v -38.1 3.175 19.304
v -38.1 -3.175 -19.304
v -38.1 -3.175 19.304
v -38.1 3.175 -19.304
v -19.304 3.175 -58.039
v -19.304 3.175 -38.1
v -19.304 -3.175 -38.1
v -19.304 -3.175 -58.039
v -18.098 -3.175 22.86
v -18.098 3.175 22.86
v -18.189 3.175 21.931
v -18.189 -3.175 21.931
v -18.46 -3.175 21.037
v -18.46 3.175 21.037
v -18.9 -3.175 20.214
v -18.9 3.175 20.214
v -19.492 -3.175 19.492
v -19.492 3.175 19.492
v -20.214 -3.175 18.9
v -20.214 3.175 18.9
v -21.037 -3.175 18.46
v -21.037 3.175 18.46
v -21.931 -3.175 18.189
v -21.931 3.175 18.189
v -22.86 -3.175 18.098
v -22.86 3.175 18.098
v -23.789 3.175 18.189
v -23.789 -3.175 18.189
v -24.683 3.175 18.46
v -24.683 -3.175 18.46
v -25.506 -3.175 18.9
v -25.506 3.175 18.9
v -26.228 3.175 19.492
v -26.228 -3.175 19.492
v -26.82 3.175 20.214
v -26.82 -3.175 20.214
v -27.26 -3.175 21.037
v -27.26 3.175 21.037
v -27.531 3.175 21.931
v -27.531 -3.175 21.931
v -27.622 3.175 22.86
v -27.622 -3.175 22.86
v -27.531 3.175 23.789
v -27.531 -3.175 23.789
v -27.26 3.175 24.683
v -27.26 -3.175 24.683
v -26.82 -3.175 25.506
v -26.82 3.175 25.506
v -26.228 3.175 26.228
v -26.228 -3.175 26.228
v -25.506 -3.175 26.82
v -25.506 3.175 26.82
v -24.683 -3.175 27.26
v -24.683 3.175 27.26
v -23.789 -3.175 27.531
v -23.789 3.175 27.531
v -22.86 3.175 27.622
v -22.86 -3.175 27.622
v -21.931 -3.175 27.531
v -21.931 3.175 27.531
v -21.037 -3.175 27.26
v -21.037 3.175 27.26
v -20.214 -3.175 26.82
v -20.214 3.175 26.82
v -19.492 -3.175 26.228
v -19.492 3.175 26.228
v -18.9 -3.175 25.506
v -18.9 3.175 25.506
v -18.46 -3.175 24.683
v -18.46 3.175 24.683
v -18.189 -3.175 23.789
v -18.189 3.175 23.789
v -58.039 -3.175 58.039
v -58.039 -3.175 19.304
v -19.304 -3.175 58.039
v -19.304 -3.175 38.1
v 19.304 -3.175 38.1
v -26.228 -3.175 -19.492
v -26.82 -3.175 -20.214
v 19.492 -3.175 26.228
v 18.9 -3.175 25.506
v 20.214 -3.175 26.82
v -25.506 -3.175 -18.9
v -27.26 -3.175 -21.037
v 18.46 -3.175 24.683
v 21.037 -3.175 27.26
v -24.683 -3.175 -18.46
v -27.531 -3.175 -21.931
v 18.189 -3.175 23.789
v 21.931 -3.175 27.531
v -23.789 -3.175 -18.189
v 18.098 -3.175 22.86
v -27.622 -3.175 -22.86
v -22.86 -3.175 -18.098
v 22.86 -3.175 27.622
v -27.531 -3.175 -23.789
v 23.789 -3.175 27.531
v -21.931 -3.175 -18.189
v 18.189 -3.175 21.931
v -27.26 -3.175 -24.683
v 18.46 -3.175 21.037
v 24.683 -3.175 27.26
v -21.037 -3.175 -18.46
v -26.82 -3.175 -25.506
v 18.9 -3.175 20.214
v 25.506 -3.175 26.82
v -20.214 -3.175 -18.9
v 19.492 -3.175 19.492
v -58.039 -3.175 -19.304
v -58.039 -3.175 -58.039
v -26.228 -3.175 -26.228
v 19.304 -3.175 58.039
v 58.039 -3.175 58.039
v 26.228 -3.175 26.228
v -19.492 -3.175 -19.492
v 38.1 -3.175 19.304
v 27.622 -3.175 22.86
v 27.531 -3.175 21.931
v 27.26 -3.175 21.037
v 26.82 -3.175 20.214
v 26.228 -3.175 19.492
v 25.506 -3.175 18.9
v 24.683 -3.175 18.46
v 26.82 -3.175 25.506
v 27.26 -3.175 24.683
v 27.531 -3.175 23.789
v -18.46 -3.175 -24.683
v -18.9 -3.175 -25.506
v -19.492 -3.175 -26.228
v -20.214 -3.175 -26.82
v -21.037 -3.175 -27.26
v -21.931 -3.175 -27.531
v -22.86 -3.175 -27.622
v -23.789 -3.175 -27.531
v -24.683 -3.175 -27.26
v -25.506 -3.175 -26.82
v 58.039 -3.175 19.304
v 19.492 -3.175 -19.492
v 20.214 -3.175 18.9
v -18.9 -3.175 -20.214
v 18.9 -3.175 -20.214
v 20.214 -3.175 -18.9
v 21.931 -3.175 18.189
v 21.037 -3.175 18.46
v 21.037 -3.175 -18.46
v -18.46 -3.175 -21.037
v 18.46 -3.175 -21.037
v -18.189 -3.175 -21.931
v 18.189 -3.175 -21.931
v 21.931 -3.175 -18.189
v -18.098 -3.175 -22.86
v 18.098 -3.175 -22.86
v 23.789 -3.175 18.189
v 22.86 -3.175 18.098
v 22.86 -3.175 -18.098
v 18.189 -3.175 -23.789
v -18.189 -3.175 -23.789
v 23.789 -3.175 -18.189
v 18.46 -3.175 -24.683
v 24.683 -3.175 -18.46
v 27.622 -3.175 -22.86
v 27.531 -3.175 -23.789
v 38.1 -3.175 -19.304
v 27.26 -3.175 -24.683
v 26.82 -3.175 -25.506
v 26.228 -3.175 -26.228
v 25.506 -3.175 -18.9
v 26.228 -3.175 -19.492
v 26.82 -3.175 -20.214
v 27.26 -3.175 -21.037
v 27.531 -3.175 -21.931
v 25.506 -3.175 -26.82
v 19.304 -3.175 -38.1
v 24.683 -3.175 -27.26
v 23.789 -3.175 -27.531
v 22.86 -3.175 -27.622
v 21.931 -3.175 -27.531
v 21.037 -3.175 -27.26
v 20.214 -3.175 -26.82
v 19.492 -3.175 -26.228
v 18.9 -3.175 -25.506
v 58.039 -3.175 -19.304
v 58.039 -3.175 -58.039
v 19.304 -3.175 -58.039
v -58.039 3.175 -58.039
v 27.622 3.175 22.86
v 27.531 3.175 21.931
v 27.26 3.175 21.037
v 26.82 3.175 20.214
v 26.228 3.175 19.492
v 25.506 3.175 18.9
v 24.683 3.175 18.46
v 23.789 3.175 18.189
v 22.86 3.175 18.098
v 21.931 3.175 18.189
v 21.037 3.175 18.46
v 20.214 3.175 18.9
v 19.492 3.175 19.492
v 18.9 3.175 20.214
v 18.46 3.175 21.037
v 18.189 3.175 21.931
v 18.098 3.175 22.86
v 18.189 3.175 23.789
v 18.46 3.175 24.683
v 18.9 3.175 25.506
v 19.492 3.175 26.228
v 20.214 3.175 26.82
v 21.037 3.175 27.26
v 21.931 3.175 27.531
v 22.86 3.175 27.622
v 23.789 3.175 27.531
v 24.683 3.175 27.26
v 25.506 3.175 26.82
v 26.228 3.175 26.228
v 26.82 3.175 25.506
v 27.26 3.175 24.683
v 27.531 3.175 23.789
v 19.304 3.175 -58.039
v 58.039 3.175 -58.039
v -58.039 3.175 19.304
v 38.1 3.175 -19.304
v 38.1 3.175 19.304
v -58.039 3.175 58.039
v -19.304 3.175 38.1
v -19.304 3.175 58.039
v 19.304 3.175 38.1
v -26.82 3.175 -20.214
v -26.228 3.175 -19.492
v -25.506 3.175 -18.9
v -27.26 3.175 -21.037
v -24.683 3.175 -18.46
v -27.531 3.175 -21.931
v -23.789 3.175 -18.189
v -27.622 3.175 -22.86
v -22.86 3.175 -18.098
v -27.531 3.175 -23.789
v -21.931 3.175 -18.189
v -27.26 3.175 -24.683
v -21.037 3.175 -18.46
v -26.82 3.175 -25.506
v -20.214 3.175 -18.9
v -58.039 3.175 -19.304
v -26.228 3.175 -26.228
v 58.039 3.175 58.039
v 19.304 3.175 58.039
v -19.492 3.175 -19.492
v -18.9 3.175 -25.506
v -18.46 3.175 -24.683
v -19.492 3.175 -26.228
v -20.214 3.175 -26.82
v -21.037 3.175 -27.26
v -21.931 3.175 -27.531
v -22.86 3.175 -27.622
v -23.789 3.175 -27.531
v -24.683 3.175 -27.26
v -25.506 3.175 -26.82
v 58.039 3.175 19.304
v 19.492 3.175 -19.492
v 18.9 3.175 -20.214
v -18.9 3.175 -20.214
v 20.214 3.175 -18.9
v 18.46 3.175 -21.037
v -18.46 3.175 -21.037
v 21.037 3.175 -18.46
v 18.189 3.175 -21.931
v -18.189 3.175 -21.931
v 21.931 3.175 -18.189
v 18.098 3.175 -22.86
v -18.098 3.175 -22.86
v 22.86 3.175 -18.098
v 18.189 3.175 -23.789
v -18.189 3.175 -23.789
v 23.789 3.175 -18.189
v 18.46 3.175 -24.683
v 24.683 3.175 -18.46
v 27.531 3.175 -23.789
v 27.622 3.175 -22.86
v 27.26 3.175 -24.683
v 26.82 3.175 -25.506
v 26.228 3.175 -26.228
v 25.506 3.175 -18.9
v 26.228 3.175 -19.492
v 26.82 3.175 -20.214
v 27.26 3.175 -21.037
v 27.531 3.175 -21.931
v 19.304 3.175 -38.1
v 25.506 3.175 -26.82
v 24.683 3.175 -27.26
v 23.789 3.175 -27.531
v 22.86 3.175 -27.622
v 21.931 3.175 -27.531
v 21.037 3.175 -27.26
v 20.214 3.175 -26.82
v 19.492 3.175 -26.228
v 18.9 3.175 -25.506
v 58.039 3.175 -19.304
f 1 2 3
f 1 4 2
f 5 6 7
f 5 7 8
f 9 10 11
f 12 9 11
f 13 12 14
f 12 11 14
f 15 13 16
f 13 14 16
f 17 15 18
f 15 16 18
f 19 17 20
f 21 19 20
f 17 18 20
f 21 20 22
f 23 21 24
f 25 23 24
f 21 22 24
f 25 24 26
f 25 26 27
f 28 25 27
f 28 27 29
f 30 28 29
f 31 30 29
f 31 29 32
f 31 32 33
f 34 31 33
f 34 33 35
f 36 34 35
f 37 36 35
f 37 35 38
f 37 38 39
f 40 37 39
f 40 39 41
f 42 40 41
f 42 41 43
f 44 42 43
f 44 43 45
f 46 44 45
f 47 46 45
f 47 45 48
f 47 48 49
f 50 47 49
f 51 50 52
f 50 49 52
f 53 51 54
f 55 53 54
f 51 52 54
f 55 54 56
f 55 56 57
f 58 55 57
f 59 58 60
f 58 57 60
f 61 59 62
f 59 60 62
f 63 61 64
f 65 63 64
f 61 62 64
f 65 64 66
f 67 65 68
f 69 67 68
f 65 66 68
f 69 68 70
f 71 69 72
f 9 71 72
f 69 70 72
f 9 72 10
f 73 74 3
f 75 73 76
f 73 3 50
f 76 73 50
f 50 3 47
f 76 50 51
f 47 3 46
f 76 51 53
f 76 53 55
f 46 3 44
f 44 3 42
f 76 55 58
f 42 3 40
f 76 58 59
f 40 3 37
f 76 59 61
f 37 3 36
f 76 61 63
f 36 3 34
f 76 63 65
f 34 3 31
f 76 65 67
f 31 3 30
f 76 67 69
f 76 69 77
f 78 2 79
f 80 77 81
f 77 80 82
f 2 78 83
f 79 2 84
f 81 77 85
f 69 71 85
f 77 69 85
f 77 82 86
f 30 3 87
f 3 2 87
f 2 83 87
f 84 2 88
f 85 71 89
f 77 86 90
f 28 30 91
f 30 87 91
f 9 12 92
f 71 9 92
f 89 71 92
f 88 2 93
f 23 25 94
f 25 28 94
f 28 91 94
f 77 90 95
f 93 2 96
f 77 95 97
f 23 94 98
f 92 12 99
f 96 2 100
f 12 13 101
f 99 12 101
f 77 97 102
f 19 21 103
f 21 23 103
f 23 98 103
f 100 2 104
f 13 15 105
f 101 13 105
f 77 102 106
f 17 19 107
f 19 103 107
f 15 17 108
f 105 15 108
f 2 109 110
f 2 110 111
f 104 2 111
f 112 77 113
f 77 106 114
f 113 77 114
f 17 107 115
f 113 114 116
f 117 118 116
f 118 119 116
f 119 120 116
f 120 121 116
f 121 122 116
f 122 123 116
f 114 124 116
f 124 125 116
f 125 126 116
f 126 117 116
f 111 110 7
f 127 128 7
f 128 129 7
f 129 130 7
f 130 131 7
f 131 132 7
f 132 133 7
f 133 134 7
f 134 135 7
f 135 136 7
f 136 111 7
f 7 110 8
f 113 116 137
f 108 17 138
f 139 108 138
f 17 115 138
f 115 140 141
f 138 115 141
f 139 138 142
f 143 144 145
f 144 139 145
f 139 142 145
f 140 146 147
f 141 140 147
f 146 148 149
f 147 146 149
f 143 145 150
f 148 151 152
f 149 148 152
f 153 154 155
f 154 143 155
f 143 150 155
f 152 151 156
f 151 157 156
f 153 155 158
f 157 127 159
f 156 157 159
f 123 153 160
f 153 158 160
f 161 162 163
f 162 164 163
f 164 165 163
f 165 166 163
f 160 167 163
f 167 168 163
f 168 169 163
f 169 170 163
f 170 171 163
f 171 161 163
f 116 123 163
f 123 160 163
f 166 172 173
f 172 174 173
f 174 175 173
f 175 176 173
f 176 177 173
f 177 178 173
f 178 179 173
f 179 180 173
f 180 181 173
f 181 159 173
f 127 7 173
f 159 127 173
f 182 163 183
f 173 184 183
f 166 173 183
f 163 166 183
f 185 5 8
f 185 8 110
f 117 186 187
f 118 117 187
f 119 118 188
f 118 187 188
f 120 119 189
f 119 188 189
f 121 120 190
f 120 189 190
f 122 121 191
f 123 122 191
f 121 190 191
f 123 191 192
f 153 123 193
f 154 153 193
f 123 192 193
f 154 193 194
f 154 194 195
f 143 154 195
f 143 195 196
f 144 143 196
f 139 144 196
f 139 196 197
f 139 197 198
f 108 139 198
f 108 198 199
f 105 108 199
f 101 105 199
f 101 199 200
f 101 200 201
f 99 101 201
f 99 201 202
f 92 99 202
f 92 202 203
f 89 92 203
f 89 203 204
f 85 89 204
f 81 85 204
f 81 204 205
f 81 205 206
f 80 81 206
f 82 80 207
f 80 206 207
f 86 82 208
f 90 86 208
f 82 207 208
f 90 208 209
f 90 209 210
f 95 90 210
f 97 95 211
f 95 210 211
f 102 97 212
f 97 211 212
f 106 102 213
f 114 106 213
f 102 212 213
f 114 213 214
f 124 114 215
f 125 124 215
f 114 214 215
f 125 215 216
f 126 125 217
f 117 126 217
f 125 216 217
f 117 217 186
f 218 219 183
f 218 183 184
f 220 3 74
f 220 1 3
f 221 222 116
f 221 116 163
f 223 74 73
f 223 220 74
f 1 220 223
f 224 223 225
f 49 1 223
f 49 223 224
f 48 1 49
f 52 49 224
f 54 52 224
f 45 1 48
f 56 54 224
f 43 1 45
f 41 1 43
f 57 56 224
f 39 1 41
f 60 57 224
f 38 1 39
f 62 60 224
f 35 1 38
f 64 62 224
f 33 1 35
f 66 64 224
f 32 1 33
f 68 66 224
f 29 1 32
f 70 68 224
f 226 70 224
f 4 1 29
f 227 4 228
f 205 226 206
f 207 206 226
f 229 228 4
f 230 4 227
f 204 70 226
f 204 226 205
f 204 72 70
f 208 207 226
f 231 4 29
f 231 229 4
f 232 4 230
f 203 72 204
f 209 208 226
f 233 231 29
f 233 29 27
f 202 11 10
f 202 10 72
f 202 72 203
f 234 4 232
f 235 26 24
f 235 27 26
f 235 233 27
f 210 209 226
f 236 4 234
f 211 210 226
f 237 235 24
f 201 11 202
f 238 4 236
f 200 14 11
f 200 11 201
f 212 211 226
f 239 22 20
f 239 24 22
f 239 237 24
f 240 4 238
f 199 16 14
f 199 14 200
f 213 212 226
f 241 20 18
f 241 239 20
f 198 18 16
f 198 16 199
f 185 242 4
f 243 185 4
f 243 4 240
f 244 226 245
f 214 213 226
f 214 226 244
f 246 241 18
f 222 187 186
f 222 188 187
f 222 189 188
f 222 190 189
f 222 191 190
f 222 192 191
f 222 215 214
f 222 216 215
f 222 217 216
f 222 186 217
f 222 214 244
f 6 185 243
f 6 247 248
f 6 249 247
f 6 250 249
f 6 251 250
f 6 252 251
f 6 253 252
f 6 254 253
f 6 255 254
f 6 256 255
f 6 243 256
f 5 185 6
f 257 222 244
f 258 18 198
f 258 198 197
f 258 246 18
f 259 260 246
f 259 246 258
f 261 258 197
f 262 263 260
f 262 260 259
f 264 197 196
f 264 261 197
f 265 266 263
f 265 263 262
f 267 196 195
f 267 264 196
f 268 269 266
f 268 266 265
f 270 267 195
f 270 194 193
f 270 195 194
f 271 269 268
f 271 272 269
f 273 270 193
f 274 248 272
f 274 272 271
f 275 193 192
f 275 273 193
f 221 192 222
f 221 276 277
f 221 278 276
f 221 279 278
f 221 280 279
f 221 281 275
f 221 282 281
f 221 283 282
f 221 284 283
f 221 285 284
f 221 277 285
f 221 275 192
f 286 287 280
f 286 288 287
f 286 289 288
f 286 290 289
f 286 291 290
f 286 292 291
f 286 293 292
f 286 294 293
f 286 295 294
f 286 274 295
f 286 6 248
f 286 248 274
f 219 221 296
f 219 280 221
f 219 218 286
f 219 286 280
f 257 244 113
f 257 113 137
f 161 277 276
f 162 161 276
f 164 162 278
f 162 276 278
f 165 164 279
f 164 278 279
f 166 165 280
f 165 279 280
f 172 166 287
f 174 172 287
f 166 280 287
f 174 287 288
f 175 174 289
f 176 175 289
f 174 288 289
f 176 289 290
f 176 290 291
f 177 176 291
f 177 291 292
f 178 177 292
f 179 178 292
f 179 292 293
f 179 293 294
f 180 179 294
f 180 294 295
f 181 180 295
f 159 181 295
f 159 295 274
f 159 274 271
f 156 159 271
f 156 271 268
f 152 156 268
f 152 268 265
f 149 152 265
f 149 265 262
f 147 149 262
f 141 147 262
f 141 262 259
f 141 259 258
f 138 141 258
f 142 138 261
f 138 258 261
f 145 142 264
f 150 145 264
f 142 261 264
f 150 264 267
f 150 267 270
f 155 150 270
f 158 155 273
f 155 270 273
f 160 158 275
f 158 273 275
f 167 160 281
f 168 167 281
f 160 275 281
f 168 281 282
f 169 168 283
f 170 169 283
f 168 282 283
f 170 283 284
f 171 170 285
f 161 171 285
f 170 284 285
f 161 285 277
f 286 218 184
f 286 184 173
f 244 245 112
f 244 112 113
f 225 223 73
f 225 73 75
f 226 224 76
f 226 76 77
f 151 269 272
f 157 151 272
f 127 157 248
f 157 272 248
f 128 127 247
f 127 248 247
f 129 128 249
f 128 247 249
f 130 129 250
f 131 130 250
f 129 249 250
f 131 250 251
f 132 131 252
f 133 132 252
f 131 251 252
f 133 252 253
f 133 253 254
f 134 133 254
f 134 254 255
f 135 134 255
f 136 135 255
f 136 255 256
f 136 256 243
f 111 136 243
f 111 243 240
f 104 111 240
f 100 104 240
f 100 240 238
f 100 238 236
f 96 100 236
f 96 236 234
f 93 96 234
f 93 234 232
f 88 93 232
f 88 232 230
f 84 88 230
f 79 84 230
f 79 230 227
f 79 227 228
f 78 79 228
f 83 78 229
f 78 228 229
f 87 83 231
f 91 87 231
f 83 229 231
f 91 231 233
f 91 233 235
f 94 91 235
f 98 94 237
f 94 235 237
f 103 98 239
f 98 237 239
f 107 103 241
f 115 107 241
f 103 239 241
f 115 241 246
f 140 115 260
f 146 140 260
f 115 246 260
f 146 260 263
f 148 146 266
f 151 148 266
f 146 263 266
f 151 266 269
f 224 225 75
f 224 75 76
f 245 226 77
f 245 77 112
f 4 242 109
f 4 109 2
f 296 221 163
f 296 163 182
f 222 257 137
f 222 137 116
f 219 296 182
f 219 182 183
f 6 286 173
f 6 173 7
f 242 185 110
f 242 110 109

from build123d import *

# Parameters (mm, degrees)
BOSS_EXTRUDE1_DEPTH = 3.175
SKETCH2_R           = 4.7625
CUT_EXTRUDE1_DEPTH  = 7.35


with BuildPart() as part:
    # Sketch1 → Boss-Extrude1 (new body, symmetric)
    with BuildSketch(Plane(origin=(0, 0, 0), x_dir=(1, 0, 0), z_dir=(0, 1, 0))):
        Polygon((-58.039, -19.304), (-58.039, -58.039), (-19.304, -58.039), (-19.304, -38.1), (19.304, -38.1), (19.304, -58.039), (58.039, -58.039), (58.039, -19.304), (38.1, -19.304), (38.1, 19.304), (58.039, 19.304), (58.039, 58.039), (19.304, 58.039), (19.304, 38.1), (-19.304, 38.1), (-19.304, 58.039), (-58.039, 58.039), (-58.039, 19.304), (-38.1, 19.304), (-38.1, -19.304), align=None)
    extrude(amount=BOSS_EXTRUDE1_DEPTH, both=True)

    # Sketch2 → Cut-Extrude1 (cut, through all)
    with BuildSketch(Plane(origin=(0, 3.175, 0), x_dir=(1, 0, 0), z_dir=(0, 1, 0))):
        with Locations((-22.86, 22.86)):
            Circle(SKETCH2_R)
        with Locations((-22.86, -22.86)):
            Circle(SKETCH2_R)
        with Locations((22.86, -22.86)):
            Circle(SKETCH2_R)
        with Locations((22.86, 22.86)):
            Circle(SKETCH2_R)
    extrude(amount=-CUT_EXTRUDE1_DEPTH, mode=Mode.SUBTRACT)


solid = part.part
